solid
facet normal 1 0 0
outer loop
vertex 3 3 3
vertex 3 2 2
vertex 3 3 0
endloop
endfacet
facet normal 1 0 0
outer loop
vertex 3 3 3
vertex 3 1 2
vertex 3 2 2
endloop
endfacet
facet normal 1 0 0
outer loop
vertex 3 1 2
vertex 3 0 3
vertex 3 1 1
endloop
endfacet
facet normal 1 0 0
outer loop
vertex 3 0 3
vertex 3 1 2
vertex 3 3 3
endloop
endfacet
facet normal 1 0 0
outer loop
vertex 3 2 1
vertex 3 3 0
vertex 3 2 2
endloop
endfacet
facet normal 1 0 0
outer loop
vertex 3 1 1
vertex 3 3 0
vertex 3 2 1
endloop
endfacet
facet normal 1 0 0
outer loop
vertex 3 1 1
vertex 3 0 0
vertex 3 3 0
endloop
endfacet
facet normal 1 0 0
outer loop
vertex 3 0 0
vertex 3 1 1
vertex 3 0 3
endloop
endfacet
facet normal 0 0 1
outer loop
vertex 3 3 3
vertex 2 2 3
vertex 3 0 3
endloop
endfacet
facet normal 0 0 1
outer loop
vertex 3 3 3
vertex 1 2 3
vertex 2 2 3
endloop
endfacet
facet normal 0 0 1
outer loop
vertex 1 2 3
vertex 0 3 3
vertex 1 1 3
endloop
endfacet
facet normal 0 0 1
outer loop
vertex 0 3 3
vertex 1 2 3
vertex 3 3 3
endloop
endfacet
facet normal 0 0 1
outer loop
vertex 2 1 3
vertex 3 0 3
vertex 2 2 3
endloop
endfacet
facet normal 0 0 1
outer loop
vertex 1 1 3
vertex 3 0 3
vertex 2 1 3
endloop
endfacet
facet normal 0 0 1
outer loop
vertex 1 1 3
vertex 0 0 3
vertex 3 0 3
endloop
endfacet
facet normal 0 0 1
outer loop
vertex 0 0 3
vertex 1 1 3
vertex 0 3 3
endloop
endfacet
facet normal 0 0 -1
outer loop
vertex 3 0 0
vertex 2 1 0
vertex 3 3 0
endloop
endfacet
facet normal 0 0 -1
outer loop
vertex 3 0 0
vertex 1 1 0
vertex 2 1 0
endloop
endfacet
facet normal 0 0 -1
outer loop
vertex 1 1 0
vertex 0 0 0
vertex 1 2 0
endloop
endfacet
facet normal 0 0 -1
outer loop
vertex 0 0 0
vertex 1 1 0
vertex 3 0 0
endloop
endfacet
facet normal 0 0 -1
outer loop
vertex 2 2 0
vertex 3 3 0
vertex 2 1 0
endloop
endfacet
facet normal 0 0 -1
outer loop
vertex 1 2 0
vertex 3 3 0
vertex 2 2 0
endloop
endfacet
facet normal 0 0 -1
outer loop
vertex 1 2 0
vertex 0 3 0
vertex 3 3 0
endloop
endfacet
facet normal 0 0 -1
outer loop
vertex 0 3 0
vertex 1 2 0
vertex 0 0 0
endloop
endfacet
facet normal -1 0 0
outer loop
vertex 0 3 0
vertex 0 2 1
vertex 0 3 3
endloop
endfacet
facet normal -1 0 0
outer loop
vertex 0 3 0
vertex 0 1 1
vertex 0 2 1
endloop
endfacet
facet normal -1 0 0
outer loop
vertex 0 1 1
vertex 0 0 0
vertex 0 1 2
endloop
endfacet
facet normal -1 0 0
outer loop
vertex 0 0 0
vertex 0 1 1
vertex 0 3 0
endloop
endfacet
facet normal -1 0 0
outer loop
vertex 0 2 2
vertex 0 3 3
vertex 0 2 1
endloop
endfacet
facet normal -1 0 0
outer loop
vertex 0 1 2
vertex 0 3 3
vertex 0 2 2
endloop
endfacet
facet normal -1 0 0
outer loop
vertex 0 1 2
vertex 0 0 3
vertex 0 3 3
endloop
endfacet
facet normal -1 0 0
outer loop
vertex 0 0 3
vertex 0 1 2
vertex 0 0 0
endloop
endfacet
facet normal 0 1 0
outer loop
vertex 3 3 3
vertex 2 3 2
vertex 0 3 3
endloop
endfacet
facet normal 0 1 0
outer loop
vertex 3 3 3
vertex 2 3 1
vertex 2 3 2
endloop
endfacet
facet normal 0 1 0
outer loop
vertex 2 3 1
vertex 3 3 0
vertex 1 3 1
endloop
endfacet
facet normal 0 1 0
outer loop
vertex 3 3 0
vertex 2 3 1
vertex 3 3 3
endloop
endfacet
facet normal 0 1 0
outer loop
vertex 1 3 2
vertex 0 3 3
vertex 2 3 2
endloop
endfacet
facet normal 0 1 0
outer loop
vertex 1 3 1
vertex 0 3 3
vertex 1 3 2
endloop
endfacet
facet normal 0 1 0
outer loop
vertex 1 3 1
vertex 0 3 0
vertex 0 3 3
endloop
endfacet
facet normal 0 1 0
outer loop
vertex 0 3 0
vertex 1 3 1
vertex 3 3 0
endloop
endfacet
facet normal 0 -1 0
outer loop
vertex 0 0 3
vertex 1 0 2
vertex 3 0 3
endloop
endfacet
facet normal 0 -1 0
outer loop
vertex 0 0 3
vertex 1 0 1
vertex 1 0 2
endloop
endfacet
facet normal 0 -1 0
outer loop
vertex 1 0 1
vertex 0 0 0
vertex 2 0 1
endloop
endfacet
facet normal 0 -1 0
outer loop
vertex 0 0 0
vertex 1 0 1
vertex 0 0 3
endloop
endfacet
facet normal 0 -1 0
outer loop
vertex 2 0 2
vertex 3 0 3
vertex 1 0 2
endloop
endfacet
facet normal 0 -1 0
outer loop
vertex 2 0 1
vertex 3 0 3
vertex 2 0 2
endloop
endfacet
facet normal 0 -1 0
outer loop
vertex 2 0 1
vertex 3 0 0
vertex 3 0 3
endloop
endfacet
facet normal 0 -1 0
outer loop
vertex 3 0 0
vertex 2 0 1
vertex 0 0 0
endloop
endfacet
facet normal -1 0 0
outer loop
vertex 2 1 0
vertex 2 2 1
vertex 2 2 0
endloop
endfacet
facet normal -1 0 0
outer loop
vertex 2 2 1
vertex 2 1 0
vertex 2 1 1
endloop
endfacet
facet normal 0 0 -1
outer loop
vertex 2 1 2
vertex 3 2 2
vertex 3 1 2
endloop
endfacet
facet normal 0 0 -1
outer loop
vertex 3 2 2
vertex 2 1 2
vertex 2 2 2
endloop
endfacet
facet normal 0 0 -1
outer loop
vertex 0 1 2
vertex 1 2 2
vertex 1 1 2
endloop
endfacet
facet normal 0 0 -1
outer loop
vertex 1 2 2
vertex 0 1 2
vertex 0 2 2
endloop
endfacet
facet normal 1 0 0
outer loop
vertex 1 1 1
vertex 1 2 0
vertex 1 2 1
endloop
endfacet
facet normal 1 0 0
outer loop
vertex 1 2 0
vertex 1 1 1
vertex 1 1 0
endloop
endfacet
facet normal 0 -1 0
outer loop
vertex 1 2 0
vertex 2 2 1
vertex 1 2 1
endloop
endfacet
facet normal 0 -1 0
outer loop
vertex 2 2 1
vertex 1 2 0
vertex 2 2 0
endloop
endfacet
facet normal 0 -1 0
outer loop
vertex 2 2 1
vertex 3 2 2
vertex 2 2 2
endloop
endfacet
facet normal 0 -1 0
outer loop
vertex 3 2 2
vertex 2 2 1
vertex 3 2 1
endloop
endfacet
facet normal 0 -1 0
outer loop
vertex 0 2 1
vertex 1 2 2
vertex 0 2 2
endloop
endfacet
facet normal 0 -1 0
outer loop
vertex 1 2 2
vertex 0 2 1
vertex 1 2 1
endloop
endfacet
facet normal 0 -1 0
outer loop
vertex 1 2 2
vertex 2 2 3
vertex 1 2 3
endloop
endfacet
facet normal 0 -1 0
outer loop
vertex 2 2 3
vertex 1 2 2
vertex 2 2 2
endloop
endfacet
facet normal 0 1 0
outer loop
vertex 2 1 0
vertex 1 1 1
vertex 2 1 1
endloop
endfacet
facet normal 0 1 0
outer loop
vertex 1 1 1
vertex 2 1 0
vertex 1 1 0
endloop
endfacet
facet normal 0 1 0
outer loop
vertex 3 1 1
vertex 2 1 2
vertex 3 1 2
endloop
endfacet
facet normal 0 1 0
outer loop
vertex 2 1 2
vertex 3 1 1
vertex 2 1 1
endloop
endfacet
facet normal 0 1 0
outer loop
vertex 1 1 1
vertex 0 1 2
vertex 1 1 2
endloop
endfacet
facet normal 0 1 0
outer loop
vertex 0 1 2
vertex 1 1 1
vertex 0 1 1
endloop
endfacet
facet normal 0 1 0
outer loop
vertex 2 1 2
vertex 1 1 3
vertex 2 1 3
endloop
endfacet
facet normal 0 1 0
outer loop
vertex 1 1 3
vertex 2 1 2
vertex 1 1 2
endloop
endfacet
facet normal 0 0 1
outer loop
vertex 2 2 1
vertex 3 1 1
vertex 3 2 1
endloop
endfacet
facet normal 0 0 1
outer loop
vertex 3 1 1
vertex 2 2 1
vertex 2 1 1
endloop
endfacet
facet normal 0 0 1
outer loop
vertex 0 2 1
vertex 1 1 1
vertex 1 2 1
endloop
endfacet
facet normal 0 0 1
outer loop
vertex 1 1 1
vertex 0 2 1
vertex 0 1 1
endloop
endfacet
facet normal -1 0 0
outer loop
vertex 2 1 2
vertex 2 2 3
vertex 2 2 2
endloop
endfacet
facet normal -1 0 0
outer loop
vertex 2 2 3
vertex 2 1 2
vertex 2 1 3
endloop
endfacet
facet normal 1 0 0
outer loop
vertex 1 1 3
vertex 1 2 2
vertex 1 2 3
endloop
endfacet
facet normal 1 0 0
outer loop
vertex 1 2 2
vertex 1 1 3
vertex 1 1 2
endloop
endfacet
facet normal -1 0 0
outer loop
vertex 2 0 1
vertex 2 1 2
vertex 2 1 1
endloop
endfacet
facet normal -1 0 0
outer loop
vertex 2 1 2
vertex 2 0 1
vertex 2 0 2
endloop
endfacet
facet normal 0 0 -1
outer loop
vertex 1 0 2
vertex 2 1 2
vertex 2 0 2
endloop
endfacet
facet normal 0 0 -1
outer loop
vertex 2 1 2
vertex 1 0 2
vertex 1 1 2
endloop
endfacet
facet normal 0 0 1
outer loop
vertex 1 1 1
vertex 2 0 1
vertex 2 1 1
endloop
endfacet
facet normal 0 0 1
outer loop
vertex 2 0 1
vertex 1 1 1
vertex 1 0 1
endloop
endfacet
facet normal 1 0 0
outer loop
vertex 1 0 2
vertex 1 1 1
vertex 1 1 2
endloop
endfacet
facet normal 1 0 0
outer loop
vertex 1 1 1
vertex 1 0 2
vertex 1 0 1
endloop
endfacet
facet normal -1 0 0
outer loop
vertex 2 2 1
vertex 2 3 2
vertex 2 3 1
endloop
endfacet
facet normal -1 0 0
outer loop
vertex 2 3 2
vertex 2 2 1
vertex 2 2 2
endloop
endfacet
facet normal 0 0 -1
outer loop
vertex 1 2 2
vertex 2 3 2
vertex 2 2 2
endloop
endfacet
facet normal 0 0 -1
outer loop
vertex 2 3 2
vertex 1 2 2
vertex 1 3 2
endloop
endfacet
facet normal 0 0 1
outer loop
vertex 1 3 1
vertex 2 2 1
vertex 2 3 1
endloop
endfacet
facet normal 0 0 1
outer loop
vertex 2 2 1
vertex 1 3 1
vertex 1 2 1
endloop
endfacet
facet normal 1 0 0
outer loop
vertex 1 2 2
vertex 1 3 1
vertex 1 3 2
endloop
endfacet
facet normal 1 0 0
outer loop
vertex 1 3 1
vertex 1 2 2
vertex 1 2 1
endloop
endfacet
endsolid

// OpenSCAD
difference() {
	cube(size=3);
	translate([1,1,1]) {	
		cube(size=1);
	}
	translate([1,1,0]) {
		cube(size=1);
	}
	translate([2,1,1]) {
		cube(size=1);
	}
	translate([0,1,1]) {
		cube(size=1);
	}
	translate([1,1,2]) {
		cube(size=1);
	}
	translate([1,0,1]) {
		cube(size=1);
	}
	translate([1,2,1]) {
		cube(size=1);
	}
}
